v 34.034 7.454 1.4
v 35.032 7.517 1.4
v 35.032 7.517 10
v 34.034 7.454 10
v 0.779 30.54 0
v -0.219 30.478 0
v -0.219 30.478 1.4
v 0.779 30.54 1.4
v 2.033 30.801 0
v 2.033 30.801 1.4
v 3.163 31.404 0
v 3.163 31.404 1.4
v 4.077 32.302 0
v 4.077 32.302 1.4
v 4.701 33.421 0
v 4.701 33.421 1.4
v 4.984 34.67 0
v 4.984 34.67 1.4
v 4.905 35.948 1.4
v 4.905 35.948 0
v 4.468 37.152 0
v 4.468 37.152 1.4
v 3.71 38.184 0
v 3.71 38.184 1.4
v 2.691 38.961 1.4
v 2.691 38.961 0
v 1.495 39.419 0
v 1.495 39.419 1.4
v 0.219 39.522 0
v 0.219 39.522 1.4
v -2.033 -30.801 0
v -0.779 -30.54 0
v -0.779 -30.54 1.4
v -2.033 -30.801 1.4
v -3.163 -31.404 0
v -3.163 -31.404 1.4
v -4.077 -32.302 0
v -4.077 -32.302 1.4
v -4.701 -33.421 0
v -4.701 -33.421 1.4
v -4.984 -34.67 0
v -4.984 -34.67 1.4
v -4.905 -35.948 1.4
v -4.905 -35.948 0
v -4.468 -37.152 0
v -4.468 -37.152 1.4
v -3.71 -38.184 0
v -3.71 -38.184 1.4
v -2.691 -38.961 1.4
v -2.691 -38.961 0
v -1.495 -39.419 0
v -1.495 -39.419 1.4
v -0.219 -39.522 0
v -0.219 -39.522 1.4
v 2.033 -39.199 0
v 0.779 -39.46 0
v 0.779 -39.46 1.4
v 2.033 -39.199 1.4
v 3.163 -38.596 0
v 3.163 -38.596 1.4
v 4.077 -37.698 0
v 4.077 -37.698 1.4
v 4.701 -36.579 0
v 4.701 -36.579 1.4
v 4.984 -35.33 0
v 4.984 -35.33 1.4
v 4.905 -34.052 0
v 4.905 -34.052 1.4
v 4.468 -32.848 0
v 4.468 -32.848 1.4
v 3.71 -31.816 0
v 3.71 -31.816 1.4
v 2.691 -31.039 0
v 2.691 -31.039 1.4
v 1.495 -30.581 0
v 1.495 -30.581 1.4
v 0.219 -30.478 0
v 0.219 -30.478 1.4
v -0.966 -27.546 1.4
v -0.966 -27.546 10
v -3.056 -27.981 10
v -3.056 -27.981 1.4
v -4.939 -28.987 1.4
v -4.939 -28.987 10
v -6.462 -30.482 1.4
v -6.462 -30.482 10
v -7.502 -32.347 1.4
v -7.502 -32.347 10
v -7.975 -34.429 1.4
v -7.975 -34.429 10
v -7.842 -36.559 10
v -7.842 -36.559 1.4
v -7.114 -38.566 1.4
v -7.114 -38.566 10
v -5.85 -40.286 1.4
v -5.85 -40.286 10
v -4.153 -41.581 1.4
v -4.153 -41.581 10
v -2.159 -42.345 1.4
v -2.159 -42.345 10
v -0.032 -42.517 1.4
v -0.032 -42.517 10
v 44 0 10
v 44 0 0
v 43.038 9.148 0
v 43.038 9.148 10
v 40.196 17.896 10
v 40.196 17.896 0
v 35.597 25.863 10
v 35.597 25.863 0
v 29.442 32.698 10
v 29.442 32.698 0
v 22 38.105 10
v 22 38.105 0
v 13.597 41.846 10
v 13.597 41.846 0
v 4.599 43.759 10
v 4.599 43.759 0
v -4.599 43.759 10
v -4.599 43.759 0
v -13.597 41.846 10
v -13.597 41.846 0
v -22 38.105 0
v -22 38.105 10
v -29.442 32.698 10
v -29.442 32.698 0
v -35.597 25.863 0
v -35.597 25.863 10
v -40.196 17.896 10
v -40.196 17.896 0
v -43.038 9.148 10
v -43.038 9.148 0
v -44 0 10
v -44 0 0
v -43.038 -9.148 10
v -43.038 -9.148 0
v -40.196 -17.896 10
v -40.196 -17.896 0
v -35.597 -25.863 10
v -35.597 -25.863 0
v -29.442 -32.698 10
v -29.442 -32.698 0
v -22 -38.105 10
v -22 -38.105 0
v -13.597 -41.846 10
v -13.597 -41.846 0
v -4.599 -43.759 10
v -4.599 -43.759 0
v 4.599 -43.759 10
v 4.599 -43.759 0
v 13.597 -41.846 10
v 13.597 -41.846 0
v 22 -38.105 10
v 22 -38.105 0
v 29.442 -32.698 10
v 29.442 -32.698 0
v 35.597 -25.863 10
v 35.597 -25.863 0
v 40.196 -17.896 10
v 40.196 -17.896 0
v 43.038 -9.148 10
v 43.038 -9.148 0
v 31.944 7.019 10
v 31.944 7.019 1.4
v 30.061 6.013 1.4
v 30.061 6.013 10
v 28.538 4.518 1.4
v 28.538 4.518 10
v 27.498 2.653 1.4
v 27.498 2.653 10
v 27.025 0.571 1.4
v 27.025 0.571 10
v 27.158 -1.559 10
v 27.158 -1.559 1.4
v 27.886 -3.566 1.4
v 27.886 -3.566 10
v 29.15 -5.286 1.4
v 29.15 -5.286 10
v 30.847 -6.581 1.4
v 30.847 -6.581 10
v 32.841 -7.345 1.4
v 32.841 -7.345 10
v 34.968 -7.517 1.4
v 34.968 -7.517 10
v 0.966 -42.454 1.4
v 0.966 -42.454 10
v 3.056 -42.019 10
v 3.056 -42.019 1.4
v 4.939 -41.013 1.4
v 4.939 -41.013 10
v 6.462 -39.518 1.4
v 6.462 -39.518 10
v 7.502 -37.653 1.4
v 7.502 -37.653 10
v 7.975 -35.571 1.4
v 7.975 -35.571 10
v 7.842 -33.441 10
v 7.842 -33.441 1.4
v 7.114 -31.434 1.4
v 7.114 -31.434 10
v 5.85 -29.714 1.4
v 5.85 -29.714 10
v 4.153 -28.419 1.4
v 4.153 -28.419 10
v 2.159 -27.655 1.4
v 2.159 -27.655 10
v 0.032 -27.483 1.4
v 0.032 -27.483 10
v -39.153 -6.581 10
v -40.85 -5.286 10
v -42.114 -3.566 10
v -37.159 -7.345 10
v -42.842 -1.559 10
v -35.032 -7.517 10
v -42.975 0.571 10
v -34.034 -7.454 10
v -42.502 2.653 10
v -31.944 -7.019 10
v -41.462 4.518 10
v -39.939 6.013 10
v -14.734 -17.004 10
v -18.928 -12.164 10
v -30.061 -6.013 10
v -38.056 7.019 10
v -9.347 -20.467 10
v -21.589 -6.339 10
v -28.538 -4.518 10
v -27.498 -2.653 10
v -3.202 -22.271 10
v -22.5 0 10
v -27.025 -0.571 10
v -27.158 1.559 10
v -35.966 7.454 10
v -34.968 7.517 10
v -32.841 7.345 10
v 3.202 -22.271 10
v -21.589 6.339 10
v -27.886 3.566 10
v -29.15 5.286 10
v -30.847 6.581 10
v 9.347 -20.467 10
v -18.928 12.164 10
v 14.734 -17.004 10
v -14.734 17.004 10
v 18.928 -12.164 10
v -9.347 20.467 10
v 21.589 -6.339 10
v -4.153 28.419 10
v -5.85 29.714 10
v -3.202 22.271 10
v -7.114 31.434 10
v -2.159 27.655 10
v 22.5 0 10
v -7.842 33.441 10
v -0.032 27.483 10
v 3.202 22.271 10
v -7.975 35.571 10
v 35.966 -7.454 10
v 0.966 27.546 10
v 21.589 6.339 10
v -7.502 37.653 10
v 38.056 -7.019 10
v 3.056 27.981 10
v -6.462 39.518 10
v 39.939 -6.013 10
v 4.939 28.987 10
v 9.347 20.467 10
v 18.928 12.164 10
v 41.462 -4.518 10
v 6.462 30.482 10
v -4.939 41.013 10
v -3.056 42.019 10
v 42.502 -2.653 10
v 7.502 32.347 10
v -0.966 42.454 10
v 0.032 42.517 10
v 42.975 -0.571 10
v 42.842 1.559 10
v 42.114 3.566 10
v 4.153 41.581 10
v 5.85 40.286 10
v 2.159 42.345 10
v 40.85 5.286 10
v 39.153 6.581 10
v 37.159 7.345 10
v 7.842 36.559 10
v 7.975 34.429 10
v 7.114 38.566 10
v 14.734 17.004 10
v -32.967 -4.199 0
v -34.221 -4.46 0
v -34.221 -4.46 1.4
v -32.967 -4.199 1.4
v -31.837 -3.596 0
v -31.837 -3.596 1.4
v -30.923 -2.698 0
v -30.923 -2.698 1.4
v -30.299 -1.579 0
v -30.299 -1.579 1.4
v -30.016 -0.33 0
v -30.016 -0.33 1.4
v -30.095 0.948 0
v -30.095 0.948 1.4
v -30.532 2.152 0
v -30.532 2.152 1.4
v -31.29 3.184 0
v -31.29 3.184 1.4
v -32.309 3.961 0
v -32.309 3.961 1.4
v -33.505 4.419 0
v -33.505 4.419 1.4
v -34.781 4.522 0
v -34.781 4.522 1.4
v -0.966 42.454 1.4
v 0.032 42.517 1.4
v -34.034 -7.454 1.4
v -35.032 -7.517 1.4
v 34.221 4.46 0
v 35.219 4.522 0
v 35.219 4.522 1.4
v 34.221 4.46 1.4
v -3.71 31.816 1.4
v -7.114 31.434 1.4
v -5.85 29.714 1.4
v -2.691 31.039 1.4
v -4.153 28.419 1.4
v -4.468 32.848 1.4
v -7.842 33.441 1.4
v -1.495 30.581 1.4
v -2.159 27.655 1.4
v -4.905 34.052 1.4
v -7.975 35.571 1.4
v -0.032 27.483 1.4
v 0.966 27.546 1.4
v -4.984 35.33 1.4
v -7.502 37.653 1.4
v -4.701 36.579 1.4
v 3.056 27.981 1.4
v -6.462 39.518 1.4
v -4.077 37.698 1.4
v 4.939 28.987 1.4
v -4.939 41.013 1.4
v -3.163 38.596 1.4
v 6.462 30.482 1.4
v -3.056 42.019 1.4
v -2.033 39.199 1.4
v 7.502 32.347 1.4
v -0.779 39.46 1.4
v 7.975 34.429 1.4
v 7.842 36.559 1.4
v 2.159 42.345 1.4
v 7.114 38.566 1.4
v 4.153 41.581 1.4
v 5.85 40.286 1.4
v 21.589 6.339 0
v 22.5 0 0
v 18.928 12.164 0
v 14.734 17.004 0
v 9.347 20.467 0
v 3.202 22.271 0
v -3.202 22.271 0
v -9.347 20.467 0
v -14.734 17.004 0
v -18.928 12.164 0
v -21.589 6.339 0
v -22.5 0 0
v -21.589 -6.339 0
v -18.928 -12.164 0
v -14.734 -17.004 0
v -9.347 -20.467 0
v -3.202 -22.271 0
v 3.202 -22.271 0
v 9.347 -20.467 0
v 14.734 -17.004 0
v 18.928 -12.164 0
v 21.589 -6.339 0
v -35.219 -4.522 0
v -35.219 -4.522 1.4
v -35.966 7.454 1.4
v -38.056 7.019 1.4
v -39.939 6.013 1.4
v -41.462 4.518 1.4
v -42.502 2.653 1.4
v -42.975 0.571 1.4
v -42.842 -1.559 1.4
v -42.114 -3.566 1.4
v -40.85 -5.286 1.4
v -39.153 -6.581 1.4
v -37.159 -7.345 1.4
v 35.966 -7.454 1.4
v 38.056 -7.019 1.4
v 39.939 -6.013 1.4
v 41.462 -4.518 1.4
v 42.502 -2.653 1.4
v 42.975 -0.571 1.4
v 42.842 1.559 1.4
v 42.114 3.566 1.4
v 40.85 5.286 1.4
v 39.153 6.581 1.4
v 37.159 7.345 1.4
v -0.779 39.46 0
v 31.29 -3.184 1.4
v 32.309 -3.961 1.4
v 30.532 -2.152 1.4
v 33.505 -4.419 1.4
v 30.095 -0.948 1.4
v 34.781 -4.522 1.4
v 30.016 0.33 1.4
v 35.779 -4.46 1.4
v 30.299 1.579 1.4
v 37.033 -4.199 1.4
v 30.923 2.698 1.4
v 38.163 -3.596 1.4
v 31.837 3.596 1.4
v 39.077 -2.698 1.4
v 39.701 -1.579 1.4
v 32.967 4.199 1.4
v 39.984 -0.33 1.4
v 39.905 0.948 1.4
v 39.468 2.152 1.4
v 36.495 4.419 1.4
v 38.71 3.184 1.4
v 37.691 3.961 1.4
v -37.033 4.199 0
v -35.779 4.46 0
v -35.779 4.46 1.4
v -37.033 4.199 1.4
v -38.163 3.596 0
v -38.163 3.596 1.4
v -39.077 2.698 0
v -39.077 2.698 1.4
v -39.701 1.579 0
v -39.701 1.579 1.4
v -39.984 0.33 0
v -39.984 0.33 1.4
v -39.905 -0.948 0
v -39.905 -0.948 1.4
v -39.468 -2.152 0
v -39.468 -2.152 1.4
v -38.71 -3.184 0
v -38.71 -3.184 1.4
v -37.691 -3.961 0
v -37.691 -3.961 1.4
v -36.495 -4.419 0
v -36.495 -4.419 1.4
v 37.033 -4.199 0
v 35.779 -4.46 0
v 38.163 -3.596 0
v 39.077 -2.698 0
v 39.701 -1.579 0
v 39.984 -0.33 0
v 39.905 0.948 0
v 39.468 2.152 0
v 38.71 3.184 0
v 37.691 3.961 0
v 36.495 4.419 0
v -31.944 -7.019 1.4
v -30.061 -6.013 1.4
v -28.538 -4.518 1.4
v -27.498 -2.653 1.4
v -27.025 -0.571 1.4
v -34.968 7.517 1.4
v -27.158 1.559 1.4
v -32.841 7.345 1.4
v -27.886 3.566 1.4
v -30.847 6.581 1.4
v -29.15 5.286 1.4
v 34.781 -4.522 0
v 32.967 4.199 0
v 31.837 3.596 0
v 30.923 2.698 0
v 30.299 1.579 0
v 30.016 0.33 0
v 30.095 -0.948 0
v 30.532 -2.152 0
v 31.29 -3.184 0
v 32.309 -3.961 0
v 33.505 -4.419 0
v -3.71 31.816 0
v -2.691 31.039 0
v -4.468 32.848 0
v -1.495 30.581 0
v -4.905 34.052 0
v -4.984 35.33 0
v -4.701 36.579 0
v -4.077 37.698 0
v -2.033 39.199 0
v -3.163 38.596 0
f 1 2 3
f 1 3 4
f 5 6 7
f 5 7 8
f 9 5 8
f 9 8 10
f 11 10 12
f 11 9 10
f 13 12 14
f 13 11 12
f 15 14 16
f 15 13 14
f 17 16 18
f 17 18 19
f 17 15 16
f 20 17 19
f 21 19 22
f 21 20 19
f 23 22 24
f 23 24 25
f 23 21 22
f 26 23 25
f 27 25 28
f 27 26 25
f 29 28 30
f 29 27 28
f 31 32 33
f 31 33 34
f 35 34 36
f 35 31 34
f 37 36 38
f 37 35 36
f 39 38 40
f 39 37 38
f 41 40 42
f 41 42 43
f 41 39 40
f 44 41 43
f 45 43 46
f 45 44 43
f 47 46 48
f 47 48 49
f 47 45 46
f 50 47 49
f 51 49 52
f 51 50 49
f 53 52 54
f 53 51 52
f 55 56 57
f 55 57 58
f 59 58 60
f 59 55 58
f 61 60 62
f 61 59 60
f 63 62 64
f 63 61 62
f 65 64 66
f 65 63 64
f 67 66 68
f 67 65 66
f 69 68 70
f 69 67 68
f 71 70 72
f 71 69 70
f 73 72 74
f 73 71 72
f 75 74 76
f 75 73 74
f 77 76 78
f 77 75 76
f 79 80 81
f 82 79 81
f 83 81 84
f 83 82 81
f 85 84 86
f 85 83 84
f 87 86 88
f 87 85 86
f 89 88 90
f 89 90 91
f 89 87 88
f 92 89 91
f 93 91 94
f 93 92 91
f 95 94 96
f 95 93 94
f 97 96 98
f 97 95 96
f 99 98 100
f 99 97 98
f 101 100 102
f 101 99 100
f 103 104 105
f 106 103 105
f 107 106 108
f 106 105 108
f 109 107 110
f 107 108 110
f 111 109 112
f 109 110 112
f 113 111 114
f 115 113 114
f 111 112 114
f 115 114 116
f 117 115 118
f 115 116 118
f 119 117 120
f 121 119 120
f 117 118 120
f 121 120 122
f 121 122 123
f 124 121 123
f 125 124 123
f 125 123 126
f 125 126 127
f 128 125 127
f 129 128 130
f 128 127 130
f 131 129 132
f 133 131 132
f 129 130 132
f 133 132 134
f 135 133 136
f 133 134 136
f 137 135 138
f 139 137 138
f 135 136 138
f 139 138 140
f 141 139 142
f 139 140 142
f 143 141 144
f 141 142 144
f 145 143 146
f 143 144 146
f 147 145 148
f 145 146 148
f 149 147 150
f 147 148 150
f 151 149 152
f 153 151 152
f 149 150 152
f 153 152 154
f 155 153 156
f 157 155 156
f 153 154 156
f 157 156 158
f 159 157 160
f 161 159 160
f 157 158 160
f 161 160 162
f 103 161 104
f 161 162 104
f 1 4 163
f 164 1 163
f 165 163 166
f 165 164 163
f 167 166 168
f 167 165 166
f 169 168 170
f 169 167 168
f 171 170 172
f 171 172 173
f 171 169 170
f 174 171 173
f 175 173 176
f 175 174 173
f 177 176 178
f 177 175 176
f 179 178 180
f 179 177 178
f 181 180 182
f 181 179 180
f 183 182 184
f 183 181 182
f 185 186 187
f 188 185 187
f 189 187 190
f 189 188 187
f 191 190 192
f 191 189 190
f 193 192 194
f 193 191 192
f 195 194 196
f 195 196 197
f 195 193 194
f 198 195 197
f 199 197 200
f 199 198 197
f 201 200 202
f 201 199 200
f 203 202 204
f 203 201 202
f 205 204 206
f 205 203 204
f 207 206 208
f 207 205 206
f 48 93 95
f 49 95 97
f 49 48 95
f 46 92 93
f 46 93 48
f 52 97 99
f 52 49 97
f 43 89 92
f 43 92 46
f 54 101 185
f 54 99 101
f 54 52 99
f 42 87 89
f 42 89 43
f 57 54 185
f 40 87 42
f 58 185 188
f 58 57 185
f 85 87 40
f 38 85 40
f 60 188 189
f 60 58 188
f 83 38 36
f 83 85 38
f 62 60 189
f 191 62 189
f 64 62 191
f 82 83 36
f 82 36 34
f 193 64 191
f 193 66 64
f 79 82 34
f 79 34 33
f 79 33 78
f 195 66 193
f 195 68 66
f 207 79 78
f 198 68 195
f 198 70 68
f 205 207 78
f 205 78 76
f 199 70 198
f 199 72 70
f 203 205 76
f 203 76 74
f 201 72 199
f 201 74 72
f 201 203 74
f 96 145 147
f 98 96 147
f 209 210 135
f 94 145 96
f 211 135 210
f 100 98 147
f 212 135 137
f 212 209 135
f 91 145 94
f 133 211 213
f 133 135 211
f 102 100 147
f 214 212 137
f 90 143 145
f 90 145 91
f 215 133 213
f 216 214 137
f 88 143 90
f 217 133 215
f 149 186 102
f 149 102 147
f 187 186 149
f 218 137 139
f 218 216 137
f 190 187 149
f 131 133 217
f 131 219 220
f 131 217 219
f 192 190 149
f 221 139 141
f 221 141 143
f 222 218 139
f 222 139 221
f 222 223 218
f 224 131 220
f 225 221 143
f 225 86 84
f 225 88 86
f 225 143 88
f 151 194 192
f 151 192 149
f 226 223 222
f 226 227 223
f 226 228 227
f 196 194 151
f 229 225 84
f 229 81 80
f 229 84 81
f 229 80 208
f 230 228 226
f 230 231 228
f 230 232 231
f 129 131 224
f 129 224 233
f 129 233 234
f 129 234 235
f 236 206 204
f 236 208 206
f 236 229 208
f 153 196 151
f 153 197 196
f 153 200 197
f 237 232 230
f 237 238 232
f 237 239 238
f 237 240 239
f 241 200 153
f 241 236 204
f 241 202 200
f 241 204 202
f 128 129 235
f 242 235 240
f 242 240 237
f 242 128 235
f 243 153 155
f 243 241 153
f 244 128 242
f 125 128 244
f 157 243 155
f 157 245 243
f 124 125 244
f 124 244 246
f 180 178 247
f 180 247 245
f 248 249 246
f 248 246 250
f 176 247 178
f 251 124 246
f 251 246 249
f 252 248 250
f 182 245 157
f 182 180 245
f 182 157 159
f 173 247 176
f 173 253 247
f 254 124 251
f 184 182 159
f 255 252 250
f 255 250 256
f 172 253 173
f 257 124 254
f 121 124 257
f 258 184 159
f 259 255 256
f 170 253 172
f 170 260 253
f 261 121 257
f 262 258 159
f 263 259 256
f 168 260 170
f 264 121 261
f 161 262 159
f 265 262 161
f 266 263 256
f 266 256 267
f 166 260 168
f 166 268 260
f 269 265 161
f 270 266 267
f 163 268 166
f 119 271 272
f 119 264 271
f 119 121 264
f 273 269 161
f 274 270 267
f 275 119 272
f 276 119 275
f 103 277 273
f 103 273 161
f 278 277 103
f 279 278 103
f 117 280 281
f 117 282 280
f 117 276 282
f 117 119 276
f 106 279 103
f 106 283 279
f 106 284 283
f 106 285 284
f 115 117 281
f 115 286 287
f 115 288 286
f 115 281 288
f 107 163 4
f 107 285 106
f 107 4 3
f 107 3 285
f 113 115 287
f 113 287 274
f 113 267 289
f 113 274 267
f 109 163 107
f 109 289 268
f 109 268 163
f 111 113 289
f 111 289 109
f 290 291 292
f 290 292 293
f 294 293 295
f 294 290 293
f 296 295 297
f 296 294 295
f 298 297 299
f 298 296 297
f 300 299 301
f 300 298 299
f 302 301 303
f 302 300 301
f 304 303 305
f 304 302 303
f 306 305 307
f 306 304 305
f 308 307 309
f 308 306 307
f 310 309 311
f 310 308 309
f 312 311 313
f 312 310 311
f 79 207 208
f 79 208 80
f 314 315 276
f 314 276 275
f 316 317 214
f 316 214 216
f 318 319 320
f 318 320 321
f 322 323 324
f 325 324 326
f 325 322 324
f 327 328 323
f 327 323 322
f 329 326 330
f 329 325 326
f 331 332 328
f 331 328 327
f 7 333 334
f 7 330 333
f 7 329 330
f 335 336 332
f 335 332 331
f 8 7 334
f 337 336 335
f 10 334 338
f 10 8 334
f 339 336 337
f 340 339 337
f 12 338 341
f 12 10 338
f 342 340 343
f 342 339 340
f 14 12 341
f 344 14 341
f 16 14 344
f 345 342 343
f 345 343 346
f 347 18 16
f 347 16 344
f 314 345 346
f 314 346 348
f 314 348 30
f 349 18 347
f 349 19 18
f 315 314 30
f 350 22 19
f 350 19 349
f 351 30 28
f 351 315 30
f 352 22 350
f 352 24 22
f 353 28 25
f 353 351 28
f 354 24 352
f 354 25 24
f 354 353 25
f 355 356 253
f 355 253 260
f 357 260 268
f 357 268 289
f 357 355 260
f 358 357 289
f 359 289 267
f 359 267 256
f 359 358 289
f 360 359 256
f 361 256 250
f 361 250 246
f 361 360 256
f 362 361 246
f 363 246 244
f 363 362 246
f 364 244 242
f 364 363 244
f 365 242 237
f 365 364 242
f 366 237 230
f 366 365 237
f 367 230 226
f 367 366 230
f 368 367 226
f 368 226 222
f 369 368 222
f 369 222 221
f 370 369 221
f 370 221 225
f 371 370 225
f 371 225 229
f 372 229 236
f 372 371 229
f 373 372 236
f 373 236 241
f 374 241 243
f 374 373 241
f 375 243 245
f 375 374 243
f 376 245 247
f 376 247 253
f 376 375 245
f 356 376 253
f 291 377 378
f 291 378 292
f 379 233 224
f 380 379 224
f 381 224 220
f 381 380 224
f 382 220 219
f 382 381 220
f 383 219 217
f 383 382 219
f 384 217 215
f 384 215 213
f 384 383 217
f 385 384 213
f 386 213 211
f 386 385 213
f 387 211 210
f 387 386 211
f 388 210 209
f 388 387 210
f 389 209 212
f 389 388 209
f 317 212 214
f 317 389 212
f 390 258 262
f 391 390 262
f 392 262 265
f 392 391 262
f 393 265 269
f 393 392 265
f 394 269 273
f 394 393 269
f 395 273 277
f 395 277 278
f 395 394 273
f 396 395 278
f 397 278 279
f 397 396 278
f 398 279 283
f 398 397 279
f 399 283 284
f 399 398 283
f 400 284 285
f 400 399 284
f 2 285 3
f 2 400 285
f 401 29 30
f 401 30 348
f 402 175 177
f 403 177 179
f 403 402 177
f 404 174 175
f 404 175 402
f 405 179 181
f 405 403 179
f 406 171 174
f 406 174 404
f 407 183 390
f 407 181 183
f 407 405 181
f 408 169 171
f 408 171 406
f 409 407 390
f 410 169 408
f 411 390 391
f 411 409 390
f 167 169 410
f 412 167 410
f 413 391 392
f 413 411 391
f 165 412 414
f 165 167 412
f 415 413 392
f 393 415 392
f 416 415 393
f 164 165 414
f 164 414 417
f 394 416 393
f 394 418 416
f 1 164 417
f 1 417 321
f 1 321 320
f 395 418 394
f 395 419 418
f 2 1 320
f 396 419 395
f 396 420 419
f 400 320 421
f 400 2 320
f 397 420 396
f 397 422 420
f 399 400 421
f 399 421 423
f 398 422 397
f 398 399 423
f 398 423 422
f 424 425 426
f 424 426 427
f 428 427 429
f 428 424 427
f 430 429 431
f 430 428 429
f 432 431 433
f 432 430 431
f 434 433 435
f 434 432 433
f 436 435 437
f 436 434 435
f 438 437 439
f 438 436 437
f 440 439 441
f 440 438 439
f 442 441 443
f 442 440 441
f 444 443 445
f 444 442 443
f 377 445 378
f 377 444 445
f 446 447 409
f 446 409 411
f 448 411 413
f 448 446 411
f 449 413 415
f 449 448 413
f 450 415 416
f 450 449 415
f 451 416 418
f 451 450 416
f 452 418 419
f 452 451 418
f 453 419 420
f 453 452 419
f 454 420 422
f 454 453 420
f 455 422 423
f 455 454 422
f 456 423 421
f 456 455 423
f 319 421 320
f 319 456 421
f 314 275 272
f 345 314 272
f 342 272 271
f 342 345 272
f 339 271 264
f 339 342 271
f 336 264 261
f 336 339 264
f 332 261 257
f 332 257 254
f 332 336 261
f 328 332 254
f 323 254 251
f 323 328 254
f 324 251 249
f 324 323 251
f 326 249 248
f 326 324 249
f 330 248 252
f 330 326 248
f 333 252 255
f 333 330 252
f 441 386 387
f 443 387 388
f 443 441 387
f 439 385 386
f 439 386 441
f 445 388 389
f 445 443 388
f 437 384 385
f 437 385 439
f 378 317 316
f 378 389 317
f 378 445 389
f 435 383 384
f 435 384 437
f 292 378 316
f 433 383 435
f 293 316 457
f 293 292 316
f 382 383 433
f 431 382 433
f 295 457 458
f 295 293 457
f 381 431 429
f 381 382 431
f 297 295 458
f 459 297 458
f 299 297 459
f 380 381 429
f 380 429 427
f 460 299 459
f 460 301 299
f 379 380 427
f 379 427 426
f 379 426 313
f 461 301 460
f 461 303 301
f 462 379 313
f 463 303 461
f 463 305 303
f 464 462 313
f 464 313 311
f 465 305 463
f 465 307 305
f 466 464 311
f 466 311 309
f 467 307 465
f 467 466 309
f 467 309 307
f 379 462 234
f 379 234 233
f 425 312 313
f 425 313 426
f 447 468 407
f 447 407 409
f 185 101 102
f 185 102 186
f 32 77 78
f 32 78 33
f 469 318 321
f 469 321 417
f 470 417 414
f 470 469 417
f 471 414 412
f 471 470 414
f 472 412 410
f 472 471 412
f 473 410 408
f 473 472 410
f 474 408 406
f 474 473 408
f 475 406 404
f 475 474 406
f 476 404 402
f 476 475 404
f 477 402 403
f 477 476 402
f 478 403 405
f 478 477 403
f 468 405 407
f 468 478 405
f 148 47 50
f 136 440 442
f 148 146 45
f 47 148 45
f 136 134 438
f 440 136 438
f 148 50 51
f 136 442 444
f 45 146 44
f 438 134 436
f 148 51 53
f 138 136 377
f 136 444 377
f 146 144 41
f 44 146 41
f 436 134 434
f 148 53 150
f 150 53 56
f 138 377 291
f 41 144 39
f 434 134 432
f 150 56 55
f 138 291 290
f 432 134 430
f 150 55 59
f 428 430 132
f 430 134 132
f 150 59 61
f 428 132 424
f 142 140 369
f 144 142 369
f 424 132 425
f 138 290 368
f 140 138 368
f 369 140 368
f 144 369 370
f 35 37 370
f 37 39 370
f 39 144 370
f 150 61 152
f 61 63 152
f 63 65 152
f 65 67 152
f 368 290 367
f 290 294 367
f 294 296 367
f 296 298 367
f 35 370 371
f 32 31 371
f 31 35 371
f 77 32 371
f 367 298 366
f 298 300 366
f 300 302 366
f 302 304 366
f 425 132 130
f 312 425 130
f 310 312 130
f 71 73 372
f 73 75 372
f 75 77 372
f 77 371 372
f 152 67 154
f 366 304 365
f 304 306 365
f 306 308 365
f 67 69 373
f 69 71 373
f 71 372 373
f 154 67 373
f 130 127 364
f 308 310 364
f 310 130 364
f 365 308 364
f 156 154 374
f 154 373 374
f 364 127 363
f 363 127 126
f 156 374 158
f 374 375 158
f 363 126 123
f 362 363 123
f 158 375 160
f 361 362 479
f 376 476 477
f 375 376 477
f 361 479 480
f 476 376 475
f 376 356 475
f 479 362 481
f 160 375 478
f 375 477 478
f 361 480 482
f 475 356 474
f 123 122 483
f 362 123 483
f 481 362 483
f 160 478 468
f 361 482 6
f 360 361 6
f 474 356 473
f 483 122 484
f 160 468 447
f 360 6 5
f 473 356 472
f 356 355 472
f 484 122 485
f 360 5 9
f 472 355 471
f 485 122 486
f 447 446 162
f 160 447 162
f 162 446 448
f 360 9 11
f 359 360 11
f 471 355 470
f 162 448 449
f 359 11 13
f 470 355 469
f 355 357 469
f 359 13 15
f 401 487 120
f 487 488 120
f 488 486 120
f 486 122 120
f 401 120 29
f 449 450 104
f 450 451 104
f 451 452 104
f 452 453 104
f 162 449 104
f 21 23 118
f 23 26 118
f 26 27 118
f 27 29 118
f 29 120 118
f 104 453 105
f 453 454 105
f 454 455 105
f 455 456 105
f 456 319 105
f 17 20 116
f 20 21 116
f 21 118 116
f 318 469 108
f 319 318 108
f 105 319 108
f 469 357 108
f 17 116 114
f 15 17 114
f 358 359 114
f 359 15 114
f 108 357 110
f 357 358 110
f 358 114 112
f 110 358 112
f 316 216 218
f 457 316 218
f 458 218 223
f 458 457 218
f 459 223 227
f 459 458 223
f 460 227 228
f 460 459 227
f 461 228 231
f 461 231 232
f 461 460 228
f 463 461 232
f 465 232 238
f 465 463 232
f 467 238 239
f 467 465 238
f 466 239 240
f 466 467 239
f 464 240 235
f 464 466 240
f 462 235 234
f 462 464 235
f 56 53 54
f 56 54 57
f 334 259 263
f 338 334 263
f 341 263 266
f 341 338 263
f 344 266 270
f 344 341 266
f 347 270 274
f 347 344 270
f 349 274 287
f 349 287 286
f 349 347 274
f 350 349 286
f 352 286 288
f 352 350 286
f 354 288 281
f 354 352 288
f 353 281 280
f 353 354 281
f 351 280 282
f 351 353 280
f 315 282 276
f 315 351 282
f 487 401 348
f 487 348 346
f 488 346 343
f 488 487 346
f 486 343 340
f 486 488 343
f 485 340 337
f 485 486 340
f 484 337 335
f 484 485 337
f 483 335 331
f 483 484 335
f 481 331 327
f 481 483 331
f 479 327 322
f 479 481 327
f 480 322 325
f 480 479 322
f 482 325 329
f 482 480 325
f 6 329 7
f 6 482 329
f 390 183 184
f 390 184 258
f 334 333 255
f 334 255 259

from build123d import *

# Parameters (mm, degrees)
IZIM1_R                                     = 44
IZIM1_R_2                                   = 22.5
Y_KSEKLIK_EKSTR_ZYON1_DEPTH                 = 10
M8_START                                    = 1.4
M8_ALT_GEN_ALYAN_BA_L_K_R_VIDA_IN_HAV_DEPTH = 8.6
M8_ALT_GEN_ALYAN_BA_L_K_R_VIDA_IN_3_DEPTH   = 1.4


# Read off the part's stored shape, not the designer's step: M8 Altıgen Alyan Başlı Kör Vida İçin Havşa1
with BuildPart() as part:
    # Çizim1 → Yükseklik-Ekstrüzyon1 (new body)
    with BuildSketch(Plane.XY):
        Circle(IZIM1_R)
        Circle(IZIM1_R_2, mode=Mode.SUBTRACT)
    extrude(amount=Y_KSEKLIK_EKSTR_ZYON1_DEPTH)

    # M8 Alt_gen Alyan Ba_l_ K_r Vida _in  2 → M8 Altıgen Alyan Başlı Kör Vida İçin Havşa1 (cut)
    with BuildSketch(Plane.XY.offset(M8_START)):
        with BuildLine():
            Line((-35.031641101, -7.516581593), (-34.033584774, -7.454263318))
            ThreePointArc((-34.033584774, -7.454263318), (-27.015549381, 0.4985462), (-34.968358899, 7.516581593))
            Line((-34.968358899, 7.516581593), (-35.966415226, 7.454263318))
            ThreePointArc((-35.966415226, 7.454263318), (-42.984450619, -0.4985462), (-35.031641101, -7.516581593))
        make_face()
        with BuildLine():
            Line((-0.031641101, -42.516581593), (0.966415226, -42.454263318))
            ThreePointArc((0.966415226, -42.454263318), (7.984450619, -34.5014538), (0.031641101, -27.483418407))
            Line((0.031641101, -27.483418407), (-0.966415226, -27.545736682))
            ThreePointArc((-0.966415226, -27.545736682), (-7.984450619, -35.4985462), (-0.031641101, -42.516581593))
        make_face()
        with BuildLine():
            Line((34.968358899, -7.516581593), (35.966415226, -7.454263318))
            ThreePointArc((35.966415226, -7.454263318), (42.984450619, 0.4985462), (35.031641101, 7.516581593))
            Line((35.031641101, 7.516581593), (34.033584774, 7.454263318))
            ThreePointArc((34.033584774, 7.454263318), (27.015549381, -0.4985462), (34.968358899, -7.516581593))
        make_face()
        with BuildLine():
            Line((-0.031641101, 27.483418407), (0.966415226, 27.545736682))
            ThreePointArc((0.966415226, 27.545736682), (7.984450619, 35.4985462), (0.031641101, 42.516581593))
            Line((0.031641101, 42.516581593), (-0.966415226, 42.454263318))
            ThreePointArc((-0.966415226, 42.454263318), (-7.984450619, 34.5014538), (-0.031641101, 27.483418407))
        make_face()
    extrude(amount=M8_ALT_GEN_ALYAN_BA_L_K_R_VIDA_IN_HAV_DEPTH, mode=Mode.SUBTRACT)

    # M8 Alt_gen Alyan Ba_l_ K_r Vida _in 3 ou → M8 Alt_gen Alyan Ba_l_ K_r Vida _in  3 (cut)
    with BuildSketch(Plane.XY):
        with BuildLine():
            Line((-35.218595926, -4.522412611), (-34.220539599, -4.460094336))
            ThreePointArc((-34.220539599, -4.460094336), (-30.009718363, 0.311591375), (-34.781404074, 4.522412611))
            Line((-34.781404074, 4.522412611), (-35.779460401, 4.460094336))
            ThreePointArc((-35.779460401, 4.460094336), (-39.990281637, -0.311591375), (-35.218595926, -4.522412611))
        make_face()
        with BuildLine():
            ThreePointArc((-0.779460401, -30.539905664), (-4.990281637, -35.311591375), (-0.218595926, -39.522412611))
            Line((-0.218595926, -39.522412611), (0.779460401, -39.460094336))
            ThreePointArc((0.779460401, -39.460094336), (4.990281637, -34.688408625), (0.218595926, -30.477587389))
            Line((0.218595926, -30.477587389), (-0.779460401, -30.539905664))
        make_face()
        with BuildLine():
            Line((34.781404074, -4.522412611), (35.779460401, -4.460094336))
            ThreePointArc((35.779460401, -4.460094336), (39.990281637, 0.311591375), (35.218595926, 4.522412611))
            Line((35.218595926, 4.522412611), (34.220539599, 4.460094336))
            ThreePointArc((34.220539599, 4.460094336), (30.009718363, -0.311591375), (34.781404074, -4.522412611))
        make_face()
        with BuildLine():
            ThreePointArc((0.779460401, 30.539905664), (4.990281637, 35.311591375), (0.218595926, 39.522412611))
            Line((0.218595926, 39.522412611), (-0.779460401, 39.460094336))
            ThreePointArc((-0.779460401, 39.460094336), (-4.990281637, 34.688408625), (-0.218595926, 30.477587389))
            Line((-0.218595926, 30.477587389), (0.779460401, 30.539905664))
        make_face()
    extrude(amount=M8_ALT_GEN_ALYAN_BA_L_K_R_VIDA_IN_3_DEPTH, mode=Mode.SUBTRACT)


solid = part.part
